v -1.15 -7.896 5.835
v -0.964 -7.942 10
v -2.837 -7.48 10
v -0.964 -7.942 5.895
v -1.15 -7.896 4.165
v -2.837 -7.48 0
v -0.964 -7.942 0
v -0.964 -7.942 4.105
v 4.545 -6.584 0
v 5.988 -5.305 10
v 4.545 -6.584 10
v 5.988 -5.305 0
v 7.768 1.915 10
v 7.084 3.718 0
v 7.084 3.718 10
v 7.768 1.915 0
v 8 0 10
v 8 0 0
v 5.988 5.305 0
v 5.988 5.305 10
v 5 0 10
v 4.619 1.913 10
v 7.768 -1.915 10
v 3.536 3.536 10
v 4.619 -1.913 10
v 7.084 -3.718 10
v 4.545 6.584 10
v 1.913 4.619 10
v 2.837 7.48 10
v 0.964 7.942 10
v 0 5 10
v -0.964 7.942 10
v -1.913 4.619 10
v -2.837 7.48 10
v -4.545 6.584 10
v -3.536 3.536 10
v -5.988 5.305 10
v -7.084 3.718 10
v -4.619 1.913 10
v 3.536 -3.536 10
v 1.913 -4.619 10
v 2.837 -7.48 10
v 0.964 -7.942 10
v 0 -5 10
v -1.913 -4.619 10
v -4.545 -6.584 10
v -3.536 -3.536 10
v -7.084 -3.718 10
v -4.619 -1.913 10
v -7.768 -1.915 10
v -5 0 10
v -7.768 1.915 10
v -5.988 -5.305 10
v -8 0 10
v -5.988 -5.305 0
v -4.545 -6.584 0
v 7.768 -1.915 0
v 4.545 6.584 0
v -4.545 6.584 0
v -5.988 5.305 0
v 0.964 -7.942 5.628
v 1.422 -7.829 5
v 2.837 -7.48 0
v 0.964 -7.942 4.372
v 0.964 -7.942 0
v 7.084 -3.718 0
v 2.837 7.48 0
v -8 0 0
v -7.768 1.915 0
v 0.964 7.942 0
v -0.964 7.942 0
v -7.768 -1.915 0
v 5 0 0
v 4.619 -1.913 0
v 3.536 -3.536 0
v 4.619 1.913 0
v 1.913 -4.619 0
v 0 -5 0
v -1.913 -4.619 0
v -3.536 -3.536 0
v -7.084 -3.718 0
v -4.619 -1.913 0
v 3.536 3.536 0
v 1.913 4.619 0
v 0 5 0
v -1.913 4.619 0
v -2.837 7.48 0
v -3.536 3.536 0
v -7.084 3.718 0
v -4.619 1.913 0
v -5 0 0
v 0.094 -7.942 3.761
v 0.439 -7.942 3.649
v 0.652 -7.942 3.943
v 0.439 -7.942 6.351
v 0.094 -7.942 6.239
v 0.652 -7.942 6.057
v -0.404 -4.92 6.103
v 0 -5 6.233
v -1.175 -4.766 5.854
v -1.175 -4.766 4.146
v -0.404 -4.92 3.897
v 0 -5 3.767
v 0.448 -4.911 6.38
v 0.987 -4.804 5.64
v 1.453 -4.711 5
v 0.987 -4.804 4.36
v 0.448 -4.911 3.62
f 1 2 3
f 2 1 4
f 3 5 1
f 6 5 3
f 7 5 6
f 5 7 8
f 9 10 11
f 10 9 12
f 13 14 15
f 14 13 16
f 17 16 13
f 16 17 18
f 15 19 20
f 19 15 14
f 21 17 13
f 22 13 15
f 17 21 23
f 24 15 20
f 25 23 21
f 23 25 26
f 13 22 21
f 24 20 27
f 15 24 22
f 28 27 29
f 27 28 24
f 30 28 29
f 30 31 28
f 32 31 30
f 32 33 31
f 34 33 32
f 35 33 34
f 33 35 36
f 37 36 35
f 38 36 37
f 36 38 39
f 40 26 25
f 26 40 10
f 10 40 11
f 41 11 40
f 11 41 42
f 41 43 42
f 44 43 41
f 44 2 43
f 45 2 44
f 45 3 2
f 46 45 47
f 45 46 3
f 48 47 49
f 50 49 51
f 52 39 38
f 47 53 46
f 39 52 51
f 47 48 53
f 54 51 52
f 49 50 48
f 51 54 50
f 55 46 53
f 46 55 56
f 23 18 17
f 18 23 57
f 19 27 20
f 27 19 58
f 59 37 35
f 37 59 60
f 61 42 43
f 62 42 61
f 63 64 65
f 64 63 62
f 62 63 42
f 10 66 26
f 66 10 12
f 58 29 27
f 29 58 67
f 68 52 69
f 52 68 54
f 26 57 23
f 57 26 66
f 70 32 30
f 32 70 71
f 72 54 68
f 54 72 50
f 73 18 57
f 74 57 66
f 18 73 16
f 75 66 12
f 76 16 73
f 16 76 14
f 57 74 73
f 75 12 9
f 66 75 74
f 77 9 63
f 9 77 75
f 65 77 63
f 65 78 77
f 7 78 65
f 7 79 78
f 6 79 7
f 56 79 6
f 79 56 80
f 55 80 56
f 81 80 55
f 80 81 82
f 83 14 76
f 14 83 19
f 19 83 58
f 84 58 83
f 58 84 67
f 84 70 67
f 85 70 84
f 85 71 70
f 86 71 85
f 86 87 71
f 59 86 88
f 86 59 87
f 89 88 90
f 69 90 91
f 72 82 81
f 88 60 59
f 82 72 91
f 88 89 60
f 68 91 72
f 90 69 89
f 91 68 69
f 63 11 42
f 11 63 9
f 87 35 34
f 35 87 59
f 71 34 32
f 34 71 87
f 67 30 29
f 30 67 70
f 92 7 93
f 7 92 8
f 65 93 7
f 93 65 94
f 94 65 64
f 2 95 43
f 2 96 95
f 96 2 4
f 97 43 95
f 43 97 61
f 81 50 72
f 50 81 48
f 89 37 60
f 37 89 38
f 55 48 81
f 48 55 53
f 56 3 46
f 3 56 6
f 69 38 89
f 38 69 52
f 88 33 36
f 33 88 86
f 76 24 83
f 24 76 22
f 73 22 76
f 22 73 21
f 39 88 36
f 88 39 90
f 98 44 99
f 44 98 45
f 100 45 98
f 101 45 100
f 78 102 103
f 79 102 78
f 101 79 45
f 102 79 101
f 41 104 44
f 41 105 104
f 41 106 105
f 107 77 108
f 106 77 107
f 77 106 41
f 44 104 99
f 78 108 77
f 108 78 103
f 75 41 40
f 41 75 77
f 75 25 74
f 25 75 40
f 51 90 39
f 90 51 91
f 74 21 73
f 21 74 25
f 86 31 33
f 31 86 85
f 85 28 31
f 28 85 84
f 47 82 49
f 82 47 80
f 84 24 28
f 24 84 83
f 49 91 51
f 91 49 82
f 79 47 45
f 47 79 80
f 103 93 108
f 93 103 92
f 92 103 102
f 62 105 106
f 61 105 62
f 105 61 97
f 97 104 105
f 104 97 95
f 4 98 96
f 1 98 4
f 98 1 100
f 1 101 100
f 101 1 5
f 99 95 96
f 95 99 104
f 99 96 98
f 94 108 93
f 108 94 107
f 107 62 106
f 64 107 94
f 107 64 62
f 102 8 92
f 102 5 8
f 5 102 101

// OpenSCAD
tube_height = 10;
tube_outer = 8;
tube_inner = 8;
thickness = 3;


module scope_holder()
{
	difference()
	{
		cylinder(tube_height, tube_outer, tube_inner);
		translate([0,0,-1])
		cylinder(tube_height+2, tube_outer-thickness, tube_inner-thickness);

	}
	
}

module hole()
{
	translate([0,0,5])
	rotate([90,0,0])
	cylinder(10,1.5,1.4);
}

difference()
{
	scope_holder();
	hole();
}
